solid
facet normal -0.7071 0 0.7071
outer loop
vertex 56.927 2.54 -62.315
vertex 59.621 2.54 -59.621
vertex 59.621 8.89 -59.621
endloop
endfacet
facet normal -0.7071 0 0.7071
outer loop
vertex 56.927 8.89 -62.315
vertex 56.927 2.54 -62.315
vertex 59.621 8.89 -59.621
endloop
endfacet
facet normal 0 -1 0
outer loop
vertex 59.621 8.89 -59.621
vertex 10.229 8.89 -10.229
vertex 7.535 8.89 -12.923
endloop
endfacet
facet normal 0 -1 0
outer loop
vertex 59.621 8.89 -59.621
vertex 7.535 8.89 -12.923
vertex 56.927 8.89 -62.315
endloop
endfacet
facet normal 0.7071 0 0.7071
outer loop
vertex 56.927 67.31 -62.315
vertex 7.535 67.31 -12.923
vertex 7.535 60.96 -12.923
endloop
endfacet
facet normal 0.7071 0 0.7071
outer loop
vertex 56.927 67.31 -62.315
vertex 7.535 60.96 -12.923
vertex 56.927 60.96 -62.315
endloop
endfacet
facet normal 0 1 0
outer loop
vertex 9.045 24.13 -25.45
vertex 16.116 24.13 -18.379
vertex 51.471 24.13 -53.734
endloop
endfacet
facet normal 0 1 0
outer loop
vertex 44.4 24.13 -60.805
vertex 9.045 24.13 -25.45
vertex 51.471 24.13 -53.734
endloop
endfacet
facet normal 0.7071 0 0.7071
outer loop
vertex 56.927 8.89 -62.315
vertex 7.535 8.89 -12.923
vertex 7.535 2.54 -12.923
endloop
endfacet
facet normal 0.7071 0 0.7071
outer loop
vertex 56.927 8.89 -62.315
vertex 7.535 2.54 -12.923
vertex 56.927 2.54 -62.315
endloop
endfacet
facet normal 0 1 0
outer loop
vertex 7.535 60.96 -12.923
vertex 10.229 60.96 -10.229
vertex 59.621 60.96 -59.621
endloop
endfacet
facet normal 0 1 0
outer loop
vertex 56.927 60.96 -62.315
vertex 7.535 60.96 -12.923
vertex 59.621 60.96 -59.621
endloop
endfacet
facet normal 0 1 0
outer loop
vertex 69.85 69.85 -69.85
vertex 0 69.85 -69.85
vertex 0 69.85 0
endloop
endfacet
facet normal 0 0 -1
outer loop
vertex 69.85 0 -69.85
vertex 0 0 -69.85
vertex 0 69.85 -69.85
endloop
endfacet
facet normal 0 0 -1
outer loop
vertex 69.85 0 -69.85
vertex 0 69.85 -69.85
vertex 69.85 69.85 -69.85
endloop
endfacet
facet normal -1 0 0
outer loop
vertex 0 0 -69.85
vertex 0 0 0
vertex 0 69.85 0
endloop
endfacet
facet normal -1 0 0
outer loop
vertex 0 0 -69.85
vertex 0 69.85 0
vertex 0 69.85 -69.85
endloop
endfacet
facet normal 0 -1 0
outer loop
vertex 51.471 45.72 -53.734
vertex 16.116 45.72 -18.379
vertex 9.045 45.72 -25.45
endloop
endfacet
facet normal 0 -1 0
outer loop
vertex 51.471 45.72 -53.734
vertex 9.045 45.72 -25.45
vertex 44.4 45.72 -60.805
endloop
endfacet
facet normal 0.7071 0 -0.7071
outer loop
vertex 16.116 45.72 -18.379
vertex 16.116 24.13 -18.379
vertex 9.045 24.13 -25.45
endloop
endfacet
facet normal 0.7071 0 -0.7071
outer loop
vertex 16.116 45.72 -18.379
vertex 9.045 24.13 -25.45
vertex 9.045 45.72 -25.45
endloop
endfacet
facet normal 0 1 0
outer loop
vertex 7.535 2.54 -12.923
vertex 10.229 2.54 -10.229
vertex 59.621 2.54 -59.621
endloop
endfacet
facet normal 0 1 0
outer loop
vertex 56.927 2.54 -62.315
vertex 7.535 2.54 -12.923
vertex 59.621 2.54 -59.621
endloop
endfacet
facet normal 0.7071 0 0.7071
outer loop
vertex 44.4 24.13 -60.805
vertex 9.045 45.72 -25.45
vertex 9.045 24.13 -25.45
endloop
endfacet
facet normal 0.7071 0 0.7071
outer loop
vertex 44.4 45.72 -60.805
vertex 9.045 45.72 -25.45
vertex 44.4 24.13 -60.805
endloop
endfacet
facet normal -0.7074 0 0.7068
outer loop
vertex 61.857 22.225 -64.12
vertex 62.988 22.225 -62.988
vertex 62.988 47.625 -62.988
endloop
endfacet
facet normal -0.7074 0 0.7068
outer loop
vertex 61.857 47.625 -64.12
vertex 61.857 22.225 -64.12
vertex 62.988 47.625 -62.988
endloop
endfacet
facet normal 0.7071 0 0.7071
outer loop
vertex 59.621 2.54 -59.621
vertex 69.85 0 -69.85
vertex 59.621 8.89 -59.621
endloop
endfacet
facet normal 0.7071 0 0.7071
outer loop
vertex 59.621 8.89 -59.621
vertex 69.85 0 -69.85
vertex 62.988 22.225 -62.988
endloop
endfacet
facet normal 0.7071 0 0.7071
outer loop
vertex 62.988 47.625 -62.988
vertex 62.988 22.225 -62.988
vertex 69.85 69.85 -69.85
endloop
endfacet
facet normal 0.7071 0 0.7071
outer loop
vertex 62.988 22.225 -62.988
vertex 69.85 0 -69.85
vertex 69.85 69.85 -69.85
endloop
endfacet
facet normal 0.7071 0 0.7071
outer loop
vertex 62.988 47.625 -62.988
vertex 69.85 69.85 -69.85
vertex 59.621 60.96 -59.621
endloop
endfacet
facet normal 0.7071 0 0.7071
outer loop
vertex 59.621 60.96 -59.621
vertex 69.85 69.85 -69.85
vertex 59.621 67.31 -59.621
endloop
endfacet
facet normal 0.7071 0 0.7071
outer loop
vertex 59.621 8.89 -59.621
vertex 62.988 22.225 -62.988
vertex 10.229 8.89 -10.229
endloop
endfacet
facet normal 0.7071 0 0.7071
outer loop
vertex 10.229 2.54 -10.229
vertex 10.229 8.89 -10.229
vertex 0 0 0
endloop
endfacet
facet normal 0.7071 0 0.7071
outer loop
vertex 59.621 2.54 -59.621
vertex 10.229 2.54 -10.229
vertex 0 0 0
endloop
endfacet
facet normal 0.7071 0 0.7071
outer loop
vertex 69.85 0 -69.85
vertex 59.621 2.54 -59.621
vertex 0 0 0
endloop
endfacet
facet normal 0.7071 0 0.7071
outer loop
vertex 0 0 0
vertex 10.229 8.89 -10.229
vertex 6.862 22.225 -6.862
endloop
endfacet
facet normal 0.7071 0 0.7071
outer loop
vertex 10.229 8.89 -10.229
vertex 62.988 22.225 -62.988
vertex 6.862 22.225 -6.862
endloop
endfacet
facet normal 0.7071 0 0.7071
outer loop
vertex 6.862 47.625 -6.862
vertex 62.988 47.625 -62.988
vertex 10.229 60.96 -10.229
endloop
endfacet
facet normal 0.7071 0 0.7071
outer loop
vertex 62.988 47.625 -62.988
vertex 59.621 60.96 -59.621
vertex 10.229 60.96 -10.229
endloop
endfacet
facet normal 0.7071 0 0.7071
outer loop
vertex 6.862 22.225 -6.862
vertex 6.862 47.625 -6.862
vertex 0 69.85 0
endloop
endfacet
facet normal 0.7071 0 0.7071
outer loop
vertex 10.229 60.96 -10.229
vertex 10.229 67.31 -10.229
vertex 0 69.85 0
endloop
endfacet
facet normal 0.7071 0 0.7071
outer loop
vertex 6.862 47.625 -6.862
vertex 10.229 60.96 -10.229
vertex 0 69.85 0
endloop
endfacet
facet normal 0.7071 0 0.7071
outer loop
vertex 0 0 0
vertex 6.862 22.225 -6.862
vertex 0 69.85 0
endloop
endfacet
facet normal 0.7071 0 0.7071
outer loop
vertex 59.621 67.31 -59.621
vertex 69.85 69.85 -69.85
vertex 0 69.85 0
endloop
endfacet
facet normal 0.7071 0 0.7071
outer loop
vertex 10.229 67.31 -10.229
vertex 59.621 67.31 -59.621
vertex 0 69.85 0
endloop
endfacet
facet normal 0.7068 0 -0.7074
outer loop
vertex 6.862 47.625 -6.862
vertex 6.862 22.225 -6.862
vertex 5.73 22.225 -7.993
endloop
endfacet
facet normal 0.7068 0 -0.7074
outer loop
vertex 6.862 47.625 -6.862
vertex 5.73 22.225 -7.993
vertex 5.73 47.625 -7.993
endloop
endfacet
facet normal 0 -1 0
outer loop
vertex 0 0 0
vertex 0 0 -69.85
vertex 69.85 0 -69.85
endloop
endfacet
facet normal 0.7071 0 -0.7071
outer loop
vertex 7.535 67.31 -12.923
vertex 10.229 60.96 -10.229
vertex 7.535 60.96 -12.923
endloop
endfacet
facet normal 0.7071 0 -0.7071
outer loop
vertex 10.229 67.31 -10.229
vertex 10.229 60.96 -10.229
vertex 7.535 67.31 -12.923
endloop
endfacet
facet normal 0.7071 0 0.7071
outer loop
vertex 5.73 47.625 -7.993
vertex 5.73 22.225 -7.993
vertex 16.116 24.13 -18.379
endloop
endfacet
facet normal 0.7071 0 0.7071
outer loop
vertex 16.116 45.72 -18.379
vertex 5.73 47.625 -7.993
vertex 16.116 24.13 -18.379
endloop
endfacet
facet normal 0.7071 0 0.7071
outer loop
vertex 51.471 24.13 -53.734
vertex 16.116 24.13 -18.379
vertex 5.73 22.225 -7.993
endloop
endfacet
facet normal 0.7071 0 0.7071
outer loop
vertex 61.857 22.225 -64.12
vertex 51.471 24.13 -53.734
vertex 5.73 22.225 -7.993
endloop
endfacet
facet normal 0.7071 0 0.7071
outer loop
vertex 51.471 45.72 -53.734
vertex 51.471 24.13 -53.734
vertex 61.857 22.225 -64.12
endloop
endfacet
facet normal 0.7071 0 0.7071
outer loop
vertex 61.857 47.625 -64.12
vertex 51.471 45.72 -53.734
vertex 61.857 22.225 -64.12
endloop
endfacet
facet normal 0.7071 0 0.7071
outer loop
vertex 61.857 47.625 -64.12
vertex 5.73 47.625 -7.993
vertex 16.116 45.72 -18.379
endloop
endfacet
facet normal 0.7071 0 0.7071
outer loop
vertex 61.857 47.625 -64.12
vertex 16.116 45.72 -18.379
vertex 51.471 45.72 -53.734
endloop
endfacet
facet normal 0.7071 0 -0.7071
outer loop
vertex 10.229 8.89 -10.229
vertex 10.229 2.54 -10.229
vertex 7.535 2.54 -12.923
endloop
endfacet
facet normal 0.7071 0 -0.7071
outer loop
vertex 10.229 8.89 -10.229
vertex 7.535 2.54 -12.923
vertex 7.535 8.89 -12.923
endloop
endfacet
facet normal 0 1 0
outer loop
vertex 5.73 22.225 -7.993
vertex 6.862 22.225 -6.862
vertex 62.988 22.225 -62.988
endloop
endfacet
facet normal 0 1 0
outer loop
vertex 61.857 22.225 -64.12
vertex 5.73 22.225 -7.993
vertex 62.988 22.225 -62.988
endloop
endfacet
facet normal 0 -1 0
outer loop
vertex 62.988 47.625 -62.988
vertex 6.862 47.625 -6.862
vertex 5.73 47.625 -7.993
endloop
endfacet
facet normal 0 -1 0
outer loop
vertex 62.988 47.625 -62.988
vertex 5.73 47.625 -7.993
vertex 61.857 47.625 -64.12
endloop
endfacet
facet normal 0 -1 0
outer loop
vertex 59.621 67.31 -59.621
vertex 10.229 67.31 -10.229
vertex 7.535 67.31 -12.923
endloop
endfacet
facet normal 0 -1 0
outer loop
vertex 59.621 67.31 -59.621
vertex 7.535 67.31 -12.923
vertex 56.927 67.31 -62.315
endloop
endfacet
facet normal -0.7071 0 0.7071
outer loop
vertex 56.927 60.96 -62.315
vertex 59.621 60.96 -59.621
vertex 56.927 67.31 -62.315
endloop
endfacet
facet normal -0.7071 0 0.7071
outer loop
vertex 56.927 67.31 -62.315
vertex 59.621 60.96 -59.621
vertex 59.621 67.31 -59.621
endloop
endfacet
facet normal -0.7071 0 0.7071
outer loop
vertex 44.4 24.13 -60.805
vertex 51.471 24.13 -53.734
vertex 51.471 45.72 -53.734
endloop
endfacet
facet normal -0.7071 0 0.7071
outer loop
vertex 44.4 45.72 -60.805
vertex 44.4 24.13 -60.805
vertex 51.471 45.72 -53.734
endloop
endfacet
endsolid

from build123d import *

# Parameters (mm, degrees)
SKETCH1_W           = 69.85
SKETCH1_H           = 69.85
BOSS_EXTRUDE1_DEPTH = 69.85
CUT_EXTRUDE2_DEPTH  = 100
SKETCH3_W           = 69.85
SKETCH3_H           = 6.35
CUT_EXTRUDE4_DEPTH  = 3.81
SKETCH4_W           = 79.375
SKETCH4_H           = 25.4
CUT_EXTRUDE5_DEPTH  = 1.6
SKETCH5_W           = 50
SKETCH5_H           = 21.59
CUT_EXTRUDE6_DEPTH  = 10


with BuildPart() as part:
    # Sketch1 → Boss-Extrude1 (new body)
    with BuildSketch(Plane(origin=(0, 0, 0), x_dir=(1, 0, 0), z_dir=(0, 1, 0))):
        with Locations((34.925, 34.925)):
            Rectangle(SKETCH1_W, SKETCH1_H)
    extrude(amount=BOSS_EXTRUDE1_DEPTH)

    # Sketch2 → Cut-Extrude2 (cut)
    with BuildSketch(Plane(origin=(0, 0, 0), x_dir=(0.707106781, 0, -0.707106781), z_dir=(0.707106781, 0, 0.707106781))):
        Polygon((98.782817332, 69.85), (98.782817332, 0), (49.391408666, 0), (0, 0), (0, 69.85), (49.391408666, 69.85), align=None)
    extrude(amount=CUT_EXTRUDE2_DEPTH, mode=Mode.SUBTRACT)

    # Sketch3 → Cut-Extrude4 (cut)
    with BuildSketch(Plane(origin=(0, 0, 0), x_dir=(0.707106781, 0, -0.707106781), z_dir=(0.707106781, 0, 0.707106781))):
        with Locations((49.391408666, 5.715)):
            Rectangle(SKETCH3_W, SKETCH3_H)
        with Locations((49.391408666, 64.135)):
            Rectangle(SKETCH3_W, SKETCH3_H)
    extrude(amount=-CUT_EXTRUDE4_DEPTH, mode=Mode.SUBTRACT)

    # Sketch4 → Cut-Extrude5 (cut)
    with BuildSketch(Plane(origin=(0, 0, 0), x_dir=(0.707106781, 0, -0.707106781), z_dir=(0.707106781, 0, 0.707106781))):
        with Locations((49.391408666, 34.925)):
            Rectangle(SKETCH4_W, SKETCH4_H)
    extrude(amount=-CUT_EXTRUDE5_DEPTH, mode=Mode.SUBTRACT)

    # Sketch5 → Cut-Extrude6 (cut)
    with BuildSketch(Plane(origin=(-1.13137085, 0, -1.13137085), x_dir=(0.707106781, 0, -0.707106781), z_dir=(0.707106781, 0, 0.707106781))):
        with Locations((49.391408666, 34.925)):
            Rectangle(SKETCH5_W, SKETCH5_H)
    extrude(amount=-CUT_EXTRUDE6_DEPTH, mode=Mode.SUBTRACT)


solid = part.part
